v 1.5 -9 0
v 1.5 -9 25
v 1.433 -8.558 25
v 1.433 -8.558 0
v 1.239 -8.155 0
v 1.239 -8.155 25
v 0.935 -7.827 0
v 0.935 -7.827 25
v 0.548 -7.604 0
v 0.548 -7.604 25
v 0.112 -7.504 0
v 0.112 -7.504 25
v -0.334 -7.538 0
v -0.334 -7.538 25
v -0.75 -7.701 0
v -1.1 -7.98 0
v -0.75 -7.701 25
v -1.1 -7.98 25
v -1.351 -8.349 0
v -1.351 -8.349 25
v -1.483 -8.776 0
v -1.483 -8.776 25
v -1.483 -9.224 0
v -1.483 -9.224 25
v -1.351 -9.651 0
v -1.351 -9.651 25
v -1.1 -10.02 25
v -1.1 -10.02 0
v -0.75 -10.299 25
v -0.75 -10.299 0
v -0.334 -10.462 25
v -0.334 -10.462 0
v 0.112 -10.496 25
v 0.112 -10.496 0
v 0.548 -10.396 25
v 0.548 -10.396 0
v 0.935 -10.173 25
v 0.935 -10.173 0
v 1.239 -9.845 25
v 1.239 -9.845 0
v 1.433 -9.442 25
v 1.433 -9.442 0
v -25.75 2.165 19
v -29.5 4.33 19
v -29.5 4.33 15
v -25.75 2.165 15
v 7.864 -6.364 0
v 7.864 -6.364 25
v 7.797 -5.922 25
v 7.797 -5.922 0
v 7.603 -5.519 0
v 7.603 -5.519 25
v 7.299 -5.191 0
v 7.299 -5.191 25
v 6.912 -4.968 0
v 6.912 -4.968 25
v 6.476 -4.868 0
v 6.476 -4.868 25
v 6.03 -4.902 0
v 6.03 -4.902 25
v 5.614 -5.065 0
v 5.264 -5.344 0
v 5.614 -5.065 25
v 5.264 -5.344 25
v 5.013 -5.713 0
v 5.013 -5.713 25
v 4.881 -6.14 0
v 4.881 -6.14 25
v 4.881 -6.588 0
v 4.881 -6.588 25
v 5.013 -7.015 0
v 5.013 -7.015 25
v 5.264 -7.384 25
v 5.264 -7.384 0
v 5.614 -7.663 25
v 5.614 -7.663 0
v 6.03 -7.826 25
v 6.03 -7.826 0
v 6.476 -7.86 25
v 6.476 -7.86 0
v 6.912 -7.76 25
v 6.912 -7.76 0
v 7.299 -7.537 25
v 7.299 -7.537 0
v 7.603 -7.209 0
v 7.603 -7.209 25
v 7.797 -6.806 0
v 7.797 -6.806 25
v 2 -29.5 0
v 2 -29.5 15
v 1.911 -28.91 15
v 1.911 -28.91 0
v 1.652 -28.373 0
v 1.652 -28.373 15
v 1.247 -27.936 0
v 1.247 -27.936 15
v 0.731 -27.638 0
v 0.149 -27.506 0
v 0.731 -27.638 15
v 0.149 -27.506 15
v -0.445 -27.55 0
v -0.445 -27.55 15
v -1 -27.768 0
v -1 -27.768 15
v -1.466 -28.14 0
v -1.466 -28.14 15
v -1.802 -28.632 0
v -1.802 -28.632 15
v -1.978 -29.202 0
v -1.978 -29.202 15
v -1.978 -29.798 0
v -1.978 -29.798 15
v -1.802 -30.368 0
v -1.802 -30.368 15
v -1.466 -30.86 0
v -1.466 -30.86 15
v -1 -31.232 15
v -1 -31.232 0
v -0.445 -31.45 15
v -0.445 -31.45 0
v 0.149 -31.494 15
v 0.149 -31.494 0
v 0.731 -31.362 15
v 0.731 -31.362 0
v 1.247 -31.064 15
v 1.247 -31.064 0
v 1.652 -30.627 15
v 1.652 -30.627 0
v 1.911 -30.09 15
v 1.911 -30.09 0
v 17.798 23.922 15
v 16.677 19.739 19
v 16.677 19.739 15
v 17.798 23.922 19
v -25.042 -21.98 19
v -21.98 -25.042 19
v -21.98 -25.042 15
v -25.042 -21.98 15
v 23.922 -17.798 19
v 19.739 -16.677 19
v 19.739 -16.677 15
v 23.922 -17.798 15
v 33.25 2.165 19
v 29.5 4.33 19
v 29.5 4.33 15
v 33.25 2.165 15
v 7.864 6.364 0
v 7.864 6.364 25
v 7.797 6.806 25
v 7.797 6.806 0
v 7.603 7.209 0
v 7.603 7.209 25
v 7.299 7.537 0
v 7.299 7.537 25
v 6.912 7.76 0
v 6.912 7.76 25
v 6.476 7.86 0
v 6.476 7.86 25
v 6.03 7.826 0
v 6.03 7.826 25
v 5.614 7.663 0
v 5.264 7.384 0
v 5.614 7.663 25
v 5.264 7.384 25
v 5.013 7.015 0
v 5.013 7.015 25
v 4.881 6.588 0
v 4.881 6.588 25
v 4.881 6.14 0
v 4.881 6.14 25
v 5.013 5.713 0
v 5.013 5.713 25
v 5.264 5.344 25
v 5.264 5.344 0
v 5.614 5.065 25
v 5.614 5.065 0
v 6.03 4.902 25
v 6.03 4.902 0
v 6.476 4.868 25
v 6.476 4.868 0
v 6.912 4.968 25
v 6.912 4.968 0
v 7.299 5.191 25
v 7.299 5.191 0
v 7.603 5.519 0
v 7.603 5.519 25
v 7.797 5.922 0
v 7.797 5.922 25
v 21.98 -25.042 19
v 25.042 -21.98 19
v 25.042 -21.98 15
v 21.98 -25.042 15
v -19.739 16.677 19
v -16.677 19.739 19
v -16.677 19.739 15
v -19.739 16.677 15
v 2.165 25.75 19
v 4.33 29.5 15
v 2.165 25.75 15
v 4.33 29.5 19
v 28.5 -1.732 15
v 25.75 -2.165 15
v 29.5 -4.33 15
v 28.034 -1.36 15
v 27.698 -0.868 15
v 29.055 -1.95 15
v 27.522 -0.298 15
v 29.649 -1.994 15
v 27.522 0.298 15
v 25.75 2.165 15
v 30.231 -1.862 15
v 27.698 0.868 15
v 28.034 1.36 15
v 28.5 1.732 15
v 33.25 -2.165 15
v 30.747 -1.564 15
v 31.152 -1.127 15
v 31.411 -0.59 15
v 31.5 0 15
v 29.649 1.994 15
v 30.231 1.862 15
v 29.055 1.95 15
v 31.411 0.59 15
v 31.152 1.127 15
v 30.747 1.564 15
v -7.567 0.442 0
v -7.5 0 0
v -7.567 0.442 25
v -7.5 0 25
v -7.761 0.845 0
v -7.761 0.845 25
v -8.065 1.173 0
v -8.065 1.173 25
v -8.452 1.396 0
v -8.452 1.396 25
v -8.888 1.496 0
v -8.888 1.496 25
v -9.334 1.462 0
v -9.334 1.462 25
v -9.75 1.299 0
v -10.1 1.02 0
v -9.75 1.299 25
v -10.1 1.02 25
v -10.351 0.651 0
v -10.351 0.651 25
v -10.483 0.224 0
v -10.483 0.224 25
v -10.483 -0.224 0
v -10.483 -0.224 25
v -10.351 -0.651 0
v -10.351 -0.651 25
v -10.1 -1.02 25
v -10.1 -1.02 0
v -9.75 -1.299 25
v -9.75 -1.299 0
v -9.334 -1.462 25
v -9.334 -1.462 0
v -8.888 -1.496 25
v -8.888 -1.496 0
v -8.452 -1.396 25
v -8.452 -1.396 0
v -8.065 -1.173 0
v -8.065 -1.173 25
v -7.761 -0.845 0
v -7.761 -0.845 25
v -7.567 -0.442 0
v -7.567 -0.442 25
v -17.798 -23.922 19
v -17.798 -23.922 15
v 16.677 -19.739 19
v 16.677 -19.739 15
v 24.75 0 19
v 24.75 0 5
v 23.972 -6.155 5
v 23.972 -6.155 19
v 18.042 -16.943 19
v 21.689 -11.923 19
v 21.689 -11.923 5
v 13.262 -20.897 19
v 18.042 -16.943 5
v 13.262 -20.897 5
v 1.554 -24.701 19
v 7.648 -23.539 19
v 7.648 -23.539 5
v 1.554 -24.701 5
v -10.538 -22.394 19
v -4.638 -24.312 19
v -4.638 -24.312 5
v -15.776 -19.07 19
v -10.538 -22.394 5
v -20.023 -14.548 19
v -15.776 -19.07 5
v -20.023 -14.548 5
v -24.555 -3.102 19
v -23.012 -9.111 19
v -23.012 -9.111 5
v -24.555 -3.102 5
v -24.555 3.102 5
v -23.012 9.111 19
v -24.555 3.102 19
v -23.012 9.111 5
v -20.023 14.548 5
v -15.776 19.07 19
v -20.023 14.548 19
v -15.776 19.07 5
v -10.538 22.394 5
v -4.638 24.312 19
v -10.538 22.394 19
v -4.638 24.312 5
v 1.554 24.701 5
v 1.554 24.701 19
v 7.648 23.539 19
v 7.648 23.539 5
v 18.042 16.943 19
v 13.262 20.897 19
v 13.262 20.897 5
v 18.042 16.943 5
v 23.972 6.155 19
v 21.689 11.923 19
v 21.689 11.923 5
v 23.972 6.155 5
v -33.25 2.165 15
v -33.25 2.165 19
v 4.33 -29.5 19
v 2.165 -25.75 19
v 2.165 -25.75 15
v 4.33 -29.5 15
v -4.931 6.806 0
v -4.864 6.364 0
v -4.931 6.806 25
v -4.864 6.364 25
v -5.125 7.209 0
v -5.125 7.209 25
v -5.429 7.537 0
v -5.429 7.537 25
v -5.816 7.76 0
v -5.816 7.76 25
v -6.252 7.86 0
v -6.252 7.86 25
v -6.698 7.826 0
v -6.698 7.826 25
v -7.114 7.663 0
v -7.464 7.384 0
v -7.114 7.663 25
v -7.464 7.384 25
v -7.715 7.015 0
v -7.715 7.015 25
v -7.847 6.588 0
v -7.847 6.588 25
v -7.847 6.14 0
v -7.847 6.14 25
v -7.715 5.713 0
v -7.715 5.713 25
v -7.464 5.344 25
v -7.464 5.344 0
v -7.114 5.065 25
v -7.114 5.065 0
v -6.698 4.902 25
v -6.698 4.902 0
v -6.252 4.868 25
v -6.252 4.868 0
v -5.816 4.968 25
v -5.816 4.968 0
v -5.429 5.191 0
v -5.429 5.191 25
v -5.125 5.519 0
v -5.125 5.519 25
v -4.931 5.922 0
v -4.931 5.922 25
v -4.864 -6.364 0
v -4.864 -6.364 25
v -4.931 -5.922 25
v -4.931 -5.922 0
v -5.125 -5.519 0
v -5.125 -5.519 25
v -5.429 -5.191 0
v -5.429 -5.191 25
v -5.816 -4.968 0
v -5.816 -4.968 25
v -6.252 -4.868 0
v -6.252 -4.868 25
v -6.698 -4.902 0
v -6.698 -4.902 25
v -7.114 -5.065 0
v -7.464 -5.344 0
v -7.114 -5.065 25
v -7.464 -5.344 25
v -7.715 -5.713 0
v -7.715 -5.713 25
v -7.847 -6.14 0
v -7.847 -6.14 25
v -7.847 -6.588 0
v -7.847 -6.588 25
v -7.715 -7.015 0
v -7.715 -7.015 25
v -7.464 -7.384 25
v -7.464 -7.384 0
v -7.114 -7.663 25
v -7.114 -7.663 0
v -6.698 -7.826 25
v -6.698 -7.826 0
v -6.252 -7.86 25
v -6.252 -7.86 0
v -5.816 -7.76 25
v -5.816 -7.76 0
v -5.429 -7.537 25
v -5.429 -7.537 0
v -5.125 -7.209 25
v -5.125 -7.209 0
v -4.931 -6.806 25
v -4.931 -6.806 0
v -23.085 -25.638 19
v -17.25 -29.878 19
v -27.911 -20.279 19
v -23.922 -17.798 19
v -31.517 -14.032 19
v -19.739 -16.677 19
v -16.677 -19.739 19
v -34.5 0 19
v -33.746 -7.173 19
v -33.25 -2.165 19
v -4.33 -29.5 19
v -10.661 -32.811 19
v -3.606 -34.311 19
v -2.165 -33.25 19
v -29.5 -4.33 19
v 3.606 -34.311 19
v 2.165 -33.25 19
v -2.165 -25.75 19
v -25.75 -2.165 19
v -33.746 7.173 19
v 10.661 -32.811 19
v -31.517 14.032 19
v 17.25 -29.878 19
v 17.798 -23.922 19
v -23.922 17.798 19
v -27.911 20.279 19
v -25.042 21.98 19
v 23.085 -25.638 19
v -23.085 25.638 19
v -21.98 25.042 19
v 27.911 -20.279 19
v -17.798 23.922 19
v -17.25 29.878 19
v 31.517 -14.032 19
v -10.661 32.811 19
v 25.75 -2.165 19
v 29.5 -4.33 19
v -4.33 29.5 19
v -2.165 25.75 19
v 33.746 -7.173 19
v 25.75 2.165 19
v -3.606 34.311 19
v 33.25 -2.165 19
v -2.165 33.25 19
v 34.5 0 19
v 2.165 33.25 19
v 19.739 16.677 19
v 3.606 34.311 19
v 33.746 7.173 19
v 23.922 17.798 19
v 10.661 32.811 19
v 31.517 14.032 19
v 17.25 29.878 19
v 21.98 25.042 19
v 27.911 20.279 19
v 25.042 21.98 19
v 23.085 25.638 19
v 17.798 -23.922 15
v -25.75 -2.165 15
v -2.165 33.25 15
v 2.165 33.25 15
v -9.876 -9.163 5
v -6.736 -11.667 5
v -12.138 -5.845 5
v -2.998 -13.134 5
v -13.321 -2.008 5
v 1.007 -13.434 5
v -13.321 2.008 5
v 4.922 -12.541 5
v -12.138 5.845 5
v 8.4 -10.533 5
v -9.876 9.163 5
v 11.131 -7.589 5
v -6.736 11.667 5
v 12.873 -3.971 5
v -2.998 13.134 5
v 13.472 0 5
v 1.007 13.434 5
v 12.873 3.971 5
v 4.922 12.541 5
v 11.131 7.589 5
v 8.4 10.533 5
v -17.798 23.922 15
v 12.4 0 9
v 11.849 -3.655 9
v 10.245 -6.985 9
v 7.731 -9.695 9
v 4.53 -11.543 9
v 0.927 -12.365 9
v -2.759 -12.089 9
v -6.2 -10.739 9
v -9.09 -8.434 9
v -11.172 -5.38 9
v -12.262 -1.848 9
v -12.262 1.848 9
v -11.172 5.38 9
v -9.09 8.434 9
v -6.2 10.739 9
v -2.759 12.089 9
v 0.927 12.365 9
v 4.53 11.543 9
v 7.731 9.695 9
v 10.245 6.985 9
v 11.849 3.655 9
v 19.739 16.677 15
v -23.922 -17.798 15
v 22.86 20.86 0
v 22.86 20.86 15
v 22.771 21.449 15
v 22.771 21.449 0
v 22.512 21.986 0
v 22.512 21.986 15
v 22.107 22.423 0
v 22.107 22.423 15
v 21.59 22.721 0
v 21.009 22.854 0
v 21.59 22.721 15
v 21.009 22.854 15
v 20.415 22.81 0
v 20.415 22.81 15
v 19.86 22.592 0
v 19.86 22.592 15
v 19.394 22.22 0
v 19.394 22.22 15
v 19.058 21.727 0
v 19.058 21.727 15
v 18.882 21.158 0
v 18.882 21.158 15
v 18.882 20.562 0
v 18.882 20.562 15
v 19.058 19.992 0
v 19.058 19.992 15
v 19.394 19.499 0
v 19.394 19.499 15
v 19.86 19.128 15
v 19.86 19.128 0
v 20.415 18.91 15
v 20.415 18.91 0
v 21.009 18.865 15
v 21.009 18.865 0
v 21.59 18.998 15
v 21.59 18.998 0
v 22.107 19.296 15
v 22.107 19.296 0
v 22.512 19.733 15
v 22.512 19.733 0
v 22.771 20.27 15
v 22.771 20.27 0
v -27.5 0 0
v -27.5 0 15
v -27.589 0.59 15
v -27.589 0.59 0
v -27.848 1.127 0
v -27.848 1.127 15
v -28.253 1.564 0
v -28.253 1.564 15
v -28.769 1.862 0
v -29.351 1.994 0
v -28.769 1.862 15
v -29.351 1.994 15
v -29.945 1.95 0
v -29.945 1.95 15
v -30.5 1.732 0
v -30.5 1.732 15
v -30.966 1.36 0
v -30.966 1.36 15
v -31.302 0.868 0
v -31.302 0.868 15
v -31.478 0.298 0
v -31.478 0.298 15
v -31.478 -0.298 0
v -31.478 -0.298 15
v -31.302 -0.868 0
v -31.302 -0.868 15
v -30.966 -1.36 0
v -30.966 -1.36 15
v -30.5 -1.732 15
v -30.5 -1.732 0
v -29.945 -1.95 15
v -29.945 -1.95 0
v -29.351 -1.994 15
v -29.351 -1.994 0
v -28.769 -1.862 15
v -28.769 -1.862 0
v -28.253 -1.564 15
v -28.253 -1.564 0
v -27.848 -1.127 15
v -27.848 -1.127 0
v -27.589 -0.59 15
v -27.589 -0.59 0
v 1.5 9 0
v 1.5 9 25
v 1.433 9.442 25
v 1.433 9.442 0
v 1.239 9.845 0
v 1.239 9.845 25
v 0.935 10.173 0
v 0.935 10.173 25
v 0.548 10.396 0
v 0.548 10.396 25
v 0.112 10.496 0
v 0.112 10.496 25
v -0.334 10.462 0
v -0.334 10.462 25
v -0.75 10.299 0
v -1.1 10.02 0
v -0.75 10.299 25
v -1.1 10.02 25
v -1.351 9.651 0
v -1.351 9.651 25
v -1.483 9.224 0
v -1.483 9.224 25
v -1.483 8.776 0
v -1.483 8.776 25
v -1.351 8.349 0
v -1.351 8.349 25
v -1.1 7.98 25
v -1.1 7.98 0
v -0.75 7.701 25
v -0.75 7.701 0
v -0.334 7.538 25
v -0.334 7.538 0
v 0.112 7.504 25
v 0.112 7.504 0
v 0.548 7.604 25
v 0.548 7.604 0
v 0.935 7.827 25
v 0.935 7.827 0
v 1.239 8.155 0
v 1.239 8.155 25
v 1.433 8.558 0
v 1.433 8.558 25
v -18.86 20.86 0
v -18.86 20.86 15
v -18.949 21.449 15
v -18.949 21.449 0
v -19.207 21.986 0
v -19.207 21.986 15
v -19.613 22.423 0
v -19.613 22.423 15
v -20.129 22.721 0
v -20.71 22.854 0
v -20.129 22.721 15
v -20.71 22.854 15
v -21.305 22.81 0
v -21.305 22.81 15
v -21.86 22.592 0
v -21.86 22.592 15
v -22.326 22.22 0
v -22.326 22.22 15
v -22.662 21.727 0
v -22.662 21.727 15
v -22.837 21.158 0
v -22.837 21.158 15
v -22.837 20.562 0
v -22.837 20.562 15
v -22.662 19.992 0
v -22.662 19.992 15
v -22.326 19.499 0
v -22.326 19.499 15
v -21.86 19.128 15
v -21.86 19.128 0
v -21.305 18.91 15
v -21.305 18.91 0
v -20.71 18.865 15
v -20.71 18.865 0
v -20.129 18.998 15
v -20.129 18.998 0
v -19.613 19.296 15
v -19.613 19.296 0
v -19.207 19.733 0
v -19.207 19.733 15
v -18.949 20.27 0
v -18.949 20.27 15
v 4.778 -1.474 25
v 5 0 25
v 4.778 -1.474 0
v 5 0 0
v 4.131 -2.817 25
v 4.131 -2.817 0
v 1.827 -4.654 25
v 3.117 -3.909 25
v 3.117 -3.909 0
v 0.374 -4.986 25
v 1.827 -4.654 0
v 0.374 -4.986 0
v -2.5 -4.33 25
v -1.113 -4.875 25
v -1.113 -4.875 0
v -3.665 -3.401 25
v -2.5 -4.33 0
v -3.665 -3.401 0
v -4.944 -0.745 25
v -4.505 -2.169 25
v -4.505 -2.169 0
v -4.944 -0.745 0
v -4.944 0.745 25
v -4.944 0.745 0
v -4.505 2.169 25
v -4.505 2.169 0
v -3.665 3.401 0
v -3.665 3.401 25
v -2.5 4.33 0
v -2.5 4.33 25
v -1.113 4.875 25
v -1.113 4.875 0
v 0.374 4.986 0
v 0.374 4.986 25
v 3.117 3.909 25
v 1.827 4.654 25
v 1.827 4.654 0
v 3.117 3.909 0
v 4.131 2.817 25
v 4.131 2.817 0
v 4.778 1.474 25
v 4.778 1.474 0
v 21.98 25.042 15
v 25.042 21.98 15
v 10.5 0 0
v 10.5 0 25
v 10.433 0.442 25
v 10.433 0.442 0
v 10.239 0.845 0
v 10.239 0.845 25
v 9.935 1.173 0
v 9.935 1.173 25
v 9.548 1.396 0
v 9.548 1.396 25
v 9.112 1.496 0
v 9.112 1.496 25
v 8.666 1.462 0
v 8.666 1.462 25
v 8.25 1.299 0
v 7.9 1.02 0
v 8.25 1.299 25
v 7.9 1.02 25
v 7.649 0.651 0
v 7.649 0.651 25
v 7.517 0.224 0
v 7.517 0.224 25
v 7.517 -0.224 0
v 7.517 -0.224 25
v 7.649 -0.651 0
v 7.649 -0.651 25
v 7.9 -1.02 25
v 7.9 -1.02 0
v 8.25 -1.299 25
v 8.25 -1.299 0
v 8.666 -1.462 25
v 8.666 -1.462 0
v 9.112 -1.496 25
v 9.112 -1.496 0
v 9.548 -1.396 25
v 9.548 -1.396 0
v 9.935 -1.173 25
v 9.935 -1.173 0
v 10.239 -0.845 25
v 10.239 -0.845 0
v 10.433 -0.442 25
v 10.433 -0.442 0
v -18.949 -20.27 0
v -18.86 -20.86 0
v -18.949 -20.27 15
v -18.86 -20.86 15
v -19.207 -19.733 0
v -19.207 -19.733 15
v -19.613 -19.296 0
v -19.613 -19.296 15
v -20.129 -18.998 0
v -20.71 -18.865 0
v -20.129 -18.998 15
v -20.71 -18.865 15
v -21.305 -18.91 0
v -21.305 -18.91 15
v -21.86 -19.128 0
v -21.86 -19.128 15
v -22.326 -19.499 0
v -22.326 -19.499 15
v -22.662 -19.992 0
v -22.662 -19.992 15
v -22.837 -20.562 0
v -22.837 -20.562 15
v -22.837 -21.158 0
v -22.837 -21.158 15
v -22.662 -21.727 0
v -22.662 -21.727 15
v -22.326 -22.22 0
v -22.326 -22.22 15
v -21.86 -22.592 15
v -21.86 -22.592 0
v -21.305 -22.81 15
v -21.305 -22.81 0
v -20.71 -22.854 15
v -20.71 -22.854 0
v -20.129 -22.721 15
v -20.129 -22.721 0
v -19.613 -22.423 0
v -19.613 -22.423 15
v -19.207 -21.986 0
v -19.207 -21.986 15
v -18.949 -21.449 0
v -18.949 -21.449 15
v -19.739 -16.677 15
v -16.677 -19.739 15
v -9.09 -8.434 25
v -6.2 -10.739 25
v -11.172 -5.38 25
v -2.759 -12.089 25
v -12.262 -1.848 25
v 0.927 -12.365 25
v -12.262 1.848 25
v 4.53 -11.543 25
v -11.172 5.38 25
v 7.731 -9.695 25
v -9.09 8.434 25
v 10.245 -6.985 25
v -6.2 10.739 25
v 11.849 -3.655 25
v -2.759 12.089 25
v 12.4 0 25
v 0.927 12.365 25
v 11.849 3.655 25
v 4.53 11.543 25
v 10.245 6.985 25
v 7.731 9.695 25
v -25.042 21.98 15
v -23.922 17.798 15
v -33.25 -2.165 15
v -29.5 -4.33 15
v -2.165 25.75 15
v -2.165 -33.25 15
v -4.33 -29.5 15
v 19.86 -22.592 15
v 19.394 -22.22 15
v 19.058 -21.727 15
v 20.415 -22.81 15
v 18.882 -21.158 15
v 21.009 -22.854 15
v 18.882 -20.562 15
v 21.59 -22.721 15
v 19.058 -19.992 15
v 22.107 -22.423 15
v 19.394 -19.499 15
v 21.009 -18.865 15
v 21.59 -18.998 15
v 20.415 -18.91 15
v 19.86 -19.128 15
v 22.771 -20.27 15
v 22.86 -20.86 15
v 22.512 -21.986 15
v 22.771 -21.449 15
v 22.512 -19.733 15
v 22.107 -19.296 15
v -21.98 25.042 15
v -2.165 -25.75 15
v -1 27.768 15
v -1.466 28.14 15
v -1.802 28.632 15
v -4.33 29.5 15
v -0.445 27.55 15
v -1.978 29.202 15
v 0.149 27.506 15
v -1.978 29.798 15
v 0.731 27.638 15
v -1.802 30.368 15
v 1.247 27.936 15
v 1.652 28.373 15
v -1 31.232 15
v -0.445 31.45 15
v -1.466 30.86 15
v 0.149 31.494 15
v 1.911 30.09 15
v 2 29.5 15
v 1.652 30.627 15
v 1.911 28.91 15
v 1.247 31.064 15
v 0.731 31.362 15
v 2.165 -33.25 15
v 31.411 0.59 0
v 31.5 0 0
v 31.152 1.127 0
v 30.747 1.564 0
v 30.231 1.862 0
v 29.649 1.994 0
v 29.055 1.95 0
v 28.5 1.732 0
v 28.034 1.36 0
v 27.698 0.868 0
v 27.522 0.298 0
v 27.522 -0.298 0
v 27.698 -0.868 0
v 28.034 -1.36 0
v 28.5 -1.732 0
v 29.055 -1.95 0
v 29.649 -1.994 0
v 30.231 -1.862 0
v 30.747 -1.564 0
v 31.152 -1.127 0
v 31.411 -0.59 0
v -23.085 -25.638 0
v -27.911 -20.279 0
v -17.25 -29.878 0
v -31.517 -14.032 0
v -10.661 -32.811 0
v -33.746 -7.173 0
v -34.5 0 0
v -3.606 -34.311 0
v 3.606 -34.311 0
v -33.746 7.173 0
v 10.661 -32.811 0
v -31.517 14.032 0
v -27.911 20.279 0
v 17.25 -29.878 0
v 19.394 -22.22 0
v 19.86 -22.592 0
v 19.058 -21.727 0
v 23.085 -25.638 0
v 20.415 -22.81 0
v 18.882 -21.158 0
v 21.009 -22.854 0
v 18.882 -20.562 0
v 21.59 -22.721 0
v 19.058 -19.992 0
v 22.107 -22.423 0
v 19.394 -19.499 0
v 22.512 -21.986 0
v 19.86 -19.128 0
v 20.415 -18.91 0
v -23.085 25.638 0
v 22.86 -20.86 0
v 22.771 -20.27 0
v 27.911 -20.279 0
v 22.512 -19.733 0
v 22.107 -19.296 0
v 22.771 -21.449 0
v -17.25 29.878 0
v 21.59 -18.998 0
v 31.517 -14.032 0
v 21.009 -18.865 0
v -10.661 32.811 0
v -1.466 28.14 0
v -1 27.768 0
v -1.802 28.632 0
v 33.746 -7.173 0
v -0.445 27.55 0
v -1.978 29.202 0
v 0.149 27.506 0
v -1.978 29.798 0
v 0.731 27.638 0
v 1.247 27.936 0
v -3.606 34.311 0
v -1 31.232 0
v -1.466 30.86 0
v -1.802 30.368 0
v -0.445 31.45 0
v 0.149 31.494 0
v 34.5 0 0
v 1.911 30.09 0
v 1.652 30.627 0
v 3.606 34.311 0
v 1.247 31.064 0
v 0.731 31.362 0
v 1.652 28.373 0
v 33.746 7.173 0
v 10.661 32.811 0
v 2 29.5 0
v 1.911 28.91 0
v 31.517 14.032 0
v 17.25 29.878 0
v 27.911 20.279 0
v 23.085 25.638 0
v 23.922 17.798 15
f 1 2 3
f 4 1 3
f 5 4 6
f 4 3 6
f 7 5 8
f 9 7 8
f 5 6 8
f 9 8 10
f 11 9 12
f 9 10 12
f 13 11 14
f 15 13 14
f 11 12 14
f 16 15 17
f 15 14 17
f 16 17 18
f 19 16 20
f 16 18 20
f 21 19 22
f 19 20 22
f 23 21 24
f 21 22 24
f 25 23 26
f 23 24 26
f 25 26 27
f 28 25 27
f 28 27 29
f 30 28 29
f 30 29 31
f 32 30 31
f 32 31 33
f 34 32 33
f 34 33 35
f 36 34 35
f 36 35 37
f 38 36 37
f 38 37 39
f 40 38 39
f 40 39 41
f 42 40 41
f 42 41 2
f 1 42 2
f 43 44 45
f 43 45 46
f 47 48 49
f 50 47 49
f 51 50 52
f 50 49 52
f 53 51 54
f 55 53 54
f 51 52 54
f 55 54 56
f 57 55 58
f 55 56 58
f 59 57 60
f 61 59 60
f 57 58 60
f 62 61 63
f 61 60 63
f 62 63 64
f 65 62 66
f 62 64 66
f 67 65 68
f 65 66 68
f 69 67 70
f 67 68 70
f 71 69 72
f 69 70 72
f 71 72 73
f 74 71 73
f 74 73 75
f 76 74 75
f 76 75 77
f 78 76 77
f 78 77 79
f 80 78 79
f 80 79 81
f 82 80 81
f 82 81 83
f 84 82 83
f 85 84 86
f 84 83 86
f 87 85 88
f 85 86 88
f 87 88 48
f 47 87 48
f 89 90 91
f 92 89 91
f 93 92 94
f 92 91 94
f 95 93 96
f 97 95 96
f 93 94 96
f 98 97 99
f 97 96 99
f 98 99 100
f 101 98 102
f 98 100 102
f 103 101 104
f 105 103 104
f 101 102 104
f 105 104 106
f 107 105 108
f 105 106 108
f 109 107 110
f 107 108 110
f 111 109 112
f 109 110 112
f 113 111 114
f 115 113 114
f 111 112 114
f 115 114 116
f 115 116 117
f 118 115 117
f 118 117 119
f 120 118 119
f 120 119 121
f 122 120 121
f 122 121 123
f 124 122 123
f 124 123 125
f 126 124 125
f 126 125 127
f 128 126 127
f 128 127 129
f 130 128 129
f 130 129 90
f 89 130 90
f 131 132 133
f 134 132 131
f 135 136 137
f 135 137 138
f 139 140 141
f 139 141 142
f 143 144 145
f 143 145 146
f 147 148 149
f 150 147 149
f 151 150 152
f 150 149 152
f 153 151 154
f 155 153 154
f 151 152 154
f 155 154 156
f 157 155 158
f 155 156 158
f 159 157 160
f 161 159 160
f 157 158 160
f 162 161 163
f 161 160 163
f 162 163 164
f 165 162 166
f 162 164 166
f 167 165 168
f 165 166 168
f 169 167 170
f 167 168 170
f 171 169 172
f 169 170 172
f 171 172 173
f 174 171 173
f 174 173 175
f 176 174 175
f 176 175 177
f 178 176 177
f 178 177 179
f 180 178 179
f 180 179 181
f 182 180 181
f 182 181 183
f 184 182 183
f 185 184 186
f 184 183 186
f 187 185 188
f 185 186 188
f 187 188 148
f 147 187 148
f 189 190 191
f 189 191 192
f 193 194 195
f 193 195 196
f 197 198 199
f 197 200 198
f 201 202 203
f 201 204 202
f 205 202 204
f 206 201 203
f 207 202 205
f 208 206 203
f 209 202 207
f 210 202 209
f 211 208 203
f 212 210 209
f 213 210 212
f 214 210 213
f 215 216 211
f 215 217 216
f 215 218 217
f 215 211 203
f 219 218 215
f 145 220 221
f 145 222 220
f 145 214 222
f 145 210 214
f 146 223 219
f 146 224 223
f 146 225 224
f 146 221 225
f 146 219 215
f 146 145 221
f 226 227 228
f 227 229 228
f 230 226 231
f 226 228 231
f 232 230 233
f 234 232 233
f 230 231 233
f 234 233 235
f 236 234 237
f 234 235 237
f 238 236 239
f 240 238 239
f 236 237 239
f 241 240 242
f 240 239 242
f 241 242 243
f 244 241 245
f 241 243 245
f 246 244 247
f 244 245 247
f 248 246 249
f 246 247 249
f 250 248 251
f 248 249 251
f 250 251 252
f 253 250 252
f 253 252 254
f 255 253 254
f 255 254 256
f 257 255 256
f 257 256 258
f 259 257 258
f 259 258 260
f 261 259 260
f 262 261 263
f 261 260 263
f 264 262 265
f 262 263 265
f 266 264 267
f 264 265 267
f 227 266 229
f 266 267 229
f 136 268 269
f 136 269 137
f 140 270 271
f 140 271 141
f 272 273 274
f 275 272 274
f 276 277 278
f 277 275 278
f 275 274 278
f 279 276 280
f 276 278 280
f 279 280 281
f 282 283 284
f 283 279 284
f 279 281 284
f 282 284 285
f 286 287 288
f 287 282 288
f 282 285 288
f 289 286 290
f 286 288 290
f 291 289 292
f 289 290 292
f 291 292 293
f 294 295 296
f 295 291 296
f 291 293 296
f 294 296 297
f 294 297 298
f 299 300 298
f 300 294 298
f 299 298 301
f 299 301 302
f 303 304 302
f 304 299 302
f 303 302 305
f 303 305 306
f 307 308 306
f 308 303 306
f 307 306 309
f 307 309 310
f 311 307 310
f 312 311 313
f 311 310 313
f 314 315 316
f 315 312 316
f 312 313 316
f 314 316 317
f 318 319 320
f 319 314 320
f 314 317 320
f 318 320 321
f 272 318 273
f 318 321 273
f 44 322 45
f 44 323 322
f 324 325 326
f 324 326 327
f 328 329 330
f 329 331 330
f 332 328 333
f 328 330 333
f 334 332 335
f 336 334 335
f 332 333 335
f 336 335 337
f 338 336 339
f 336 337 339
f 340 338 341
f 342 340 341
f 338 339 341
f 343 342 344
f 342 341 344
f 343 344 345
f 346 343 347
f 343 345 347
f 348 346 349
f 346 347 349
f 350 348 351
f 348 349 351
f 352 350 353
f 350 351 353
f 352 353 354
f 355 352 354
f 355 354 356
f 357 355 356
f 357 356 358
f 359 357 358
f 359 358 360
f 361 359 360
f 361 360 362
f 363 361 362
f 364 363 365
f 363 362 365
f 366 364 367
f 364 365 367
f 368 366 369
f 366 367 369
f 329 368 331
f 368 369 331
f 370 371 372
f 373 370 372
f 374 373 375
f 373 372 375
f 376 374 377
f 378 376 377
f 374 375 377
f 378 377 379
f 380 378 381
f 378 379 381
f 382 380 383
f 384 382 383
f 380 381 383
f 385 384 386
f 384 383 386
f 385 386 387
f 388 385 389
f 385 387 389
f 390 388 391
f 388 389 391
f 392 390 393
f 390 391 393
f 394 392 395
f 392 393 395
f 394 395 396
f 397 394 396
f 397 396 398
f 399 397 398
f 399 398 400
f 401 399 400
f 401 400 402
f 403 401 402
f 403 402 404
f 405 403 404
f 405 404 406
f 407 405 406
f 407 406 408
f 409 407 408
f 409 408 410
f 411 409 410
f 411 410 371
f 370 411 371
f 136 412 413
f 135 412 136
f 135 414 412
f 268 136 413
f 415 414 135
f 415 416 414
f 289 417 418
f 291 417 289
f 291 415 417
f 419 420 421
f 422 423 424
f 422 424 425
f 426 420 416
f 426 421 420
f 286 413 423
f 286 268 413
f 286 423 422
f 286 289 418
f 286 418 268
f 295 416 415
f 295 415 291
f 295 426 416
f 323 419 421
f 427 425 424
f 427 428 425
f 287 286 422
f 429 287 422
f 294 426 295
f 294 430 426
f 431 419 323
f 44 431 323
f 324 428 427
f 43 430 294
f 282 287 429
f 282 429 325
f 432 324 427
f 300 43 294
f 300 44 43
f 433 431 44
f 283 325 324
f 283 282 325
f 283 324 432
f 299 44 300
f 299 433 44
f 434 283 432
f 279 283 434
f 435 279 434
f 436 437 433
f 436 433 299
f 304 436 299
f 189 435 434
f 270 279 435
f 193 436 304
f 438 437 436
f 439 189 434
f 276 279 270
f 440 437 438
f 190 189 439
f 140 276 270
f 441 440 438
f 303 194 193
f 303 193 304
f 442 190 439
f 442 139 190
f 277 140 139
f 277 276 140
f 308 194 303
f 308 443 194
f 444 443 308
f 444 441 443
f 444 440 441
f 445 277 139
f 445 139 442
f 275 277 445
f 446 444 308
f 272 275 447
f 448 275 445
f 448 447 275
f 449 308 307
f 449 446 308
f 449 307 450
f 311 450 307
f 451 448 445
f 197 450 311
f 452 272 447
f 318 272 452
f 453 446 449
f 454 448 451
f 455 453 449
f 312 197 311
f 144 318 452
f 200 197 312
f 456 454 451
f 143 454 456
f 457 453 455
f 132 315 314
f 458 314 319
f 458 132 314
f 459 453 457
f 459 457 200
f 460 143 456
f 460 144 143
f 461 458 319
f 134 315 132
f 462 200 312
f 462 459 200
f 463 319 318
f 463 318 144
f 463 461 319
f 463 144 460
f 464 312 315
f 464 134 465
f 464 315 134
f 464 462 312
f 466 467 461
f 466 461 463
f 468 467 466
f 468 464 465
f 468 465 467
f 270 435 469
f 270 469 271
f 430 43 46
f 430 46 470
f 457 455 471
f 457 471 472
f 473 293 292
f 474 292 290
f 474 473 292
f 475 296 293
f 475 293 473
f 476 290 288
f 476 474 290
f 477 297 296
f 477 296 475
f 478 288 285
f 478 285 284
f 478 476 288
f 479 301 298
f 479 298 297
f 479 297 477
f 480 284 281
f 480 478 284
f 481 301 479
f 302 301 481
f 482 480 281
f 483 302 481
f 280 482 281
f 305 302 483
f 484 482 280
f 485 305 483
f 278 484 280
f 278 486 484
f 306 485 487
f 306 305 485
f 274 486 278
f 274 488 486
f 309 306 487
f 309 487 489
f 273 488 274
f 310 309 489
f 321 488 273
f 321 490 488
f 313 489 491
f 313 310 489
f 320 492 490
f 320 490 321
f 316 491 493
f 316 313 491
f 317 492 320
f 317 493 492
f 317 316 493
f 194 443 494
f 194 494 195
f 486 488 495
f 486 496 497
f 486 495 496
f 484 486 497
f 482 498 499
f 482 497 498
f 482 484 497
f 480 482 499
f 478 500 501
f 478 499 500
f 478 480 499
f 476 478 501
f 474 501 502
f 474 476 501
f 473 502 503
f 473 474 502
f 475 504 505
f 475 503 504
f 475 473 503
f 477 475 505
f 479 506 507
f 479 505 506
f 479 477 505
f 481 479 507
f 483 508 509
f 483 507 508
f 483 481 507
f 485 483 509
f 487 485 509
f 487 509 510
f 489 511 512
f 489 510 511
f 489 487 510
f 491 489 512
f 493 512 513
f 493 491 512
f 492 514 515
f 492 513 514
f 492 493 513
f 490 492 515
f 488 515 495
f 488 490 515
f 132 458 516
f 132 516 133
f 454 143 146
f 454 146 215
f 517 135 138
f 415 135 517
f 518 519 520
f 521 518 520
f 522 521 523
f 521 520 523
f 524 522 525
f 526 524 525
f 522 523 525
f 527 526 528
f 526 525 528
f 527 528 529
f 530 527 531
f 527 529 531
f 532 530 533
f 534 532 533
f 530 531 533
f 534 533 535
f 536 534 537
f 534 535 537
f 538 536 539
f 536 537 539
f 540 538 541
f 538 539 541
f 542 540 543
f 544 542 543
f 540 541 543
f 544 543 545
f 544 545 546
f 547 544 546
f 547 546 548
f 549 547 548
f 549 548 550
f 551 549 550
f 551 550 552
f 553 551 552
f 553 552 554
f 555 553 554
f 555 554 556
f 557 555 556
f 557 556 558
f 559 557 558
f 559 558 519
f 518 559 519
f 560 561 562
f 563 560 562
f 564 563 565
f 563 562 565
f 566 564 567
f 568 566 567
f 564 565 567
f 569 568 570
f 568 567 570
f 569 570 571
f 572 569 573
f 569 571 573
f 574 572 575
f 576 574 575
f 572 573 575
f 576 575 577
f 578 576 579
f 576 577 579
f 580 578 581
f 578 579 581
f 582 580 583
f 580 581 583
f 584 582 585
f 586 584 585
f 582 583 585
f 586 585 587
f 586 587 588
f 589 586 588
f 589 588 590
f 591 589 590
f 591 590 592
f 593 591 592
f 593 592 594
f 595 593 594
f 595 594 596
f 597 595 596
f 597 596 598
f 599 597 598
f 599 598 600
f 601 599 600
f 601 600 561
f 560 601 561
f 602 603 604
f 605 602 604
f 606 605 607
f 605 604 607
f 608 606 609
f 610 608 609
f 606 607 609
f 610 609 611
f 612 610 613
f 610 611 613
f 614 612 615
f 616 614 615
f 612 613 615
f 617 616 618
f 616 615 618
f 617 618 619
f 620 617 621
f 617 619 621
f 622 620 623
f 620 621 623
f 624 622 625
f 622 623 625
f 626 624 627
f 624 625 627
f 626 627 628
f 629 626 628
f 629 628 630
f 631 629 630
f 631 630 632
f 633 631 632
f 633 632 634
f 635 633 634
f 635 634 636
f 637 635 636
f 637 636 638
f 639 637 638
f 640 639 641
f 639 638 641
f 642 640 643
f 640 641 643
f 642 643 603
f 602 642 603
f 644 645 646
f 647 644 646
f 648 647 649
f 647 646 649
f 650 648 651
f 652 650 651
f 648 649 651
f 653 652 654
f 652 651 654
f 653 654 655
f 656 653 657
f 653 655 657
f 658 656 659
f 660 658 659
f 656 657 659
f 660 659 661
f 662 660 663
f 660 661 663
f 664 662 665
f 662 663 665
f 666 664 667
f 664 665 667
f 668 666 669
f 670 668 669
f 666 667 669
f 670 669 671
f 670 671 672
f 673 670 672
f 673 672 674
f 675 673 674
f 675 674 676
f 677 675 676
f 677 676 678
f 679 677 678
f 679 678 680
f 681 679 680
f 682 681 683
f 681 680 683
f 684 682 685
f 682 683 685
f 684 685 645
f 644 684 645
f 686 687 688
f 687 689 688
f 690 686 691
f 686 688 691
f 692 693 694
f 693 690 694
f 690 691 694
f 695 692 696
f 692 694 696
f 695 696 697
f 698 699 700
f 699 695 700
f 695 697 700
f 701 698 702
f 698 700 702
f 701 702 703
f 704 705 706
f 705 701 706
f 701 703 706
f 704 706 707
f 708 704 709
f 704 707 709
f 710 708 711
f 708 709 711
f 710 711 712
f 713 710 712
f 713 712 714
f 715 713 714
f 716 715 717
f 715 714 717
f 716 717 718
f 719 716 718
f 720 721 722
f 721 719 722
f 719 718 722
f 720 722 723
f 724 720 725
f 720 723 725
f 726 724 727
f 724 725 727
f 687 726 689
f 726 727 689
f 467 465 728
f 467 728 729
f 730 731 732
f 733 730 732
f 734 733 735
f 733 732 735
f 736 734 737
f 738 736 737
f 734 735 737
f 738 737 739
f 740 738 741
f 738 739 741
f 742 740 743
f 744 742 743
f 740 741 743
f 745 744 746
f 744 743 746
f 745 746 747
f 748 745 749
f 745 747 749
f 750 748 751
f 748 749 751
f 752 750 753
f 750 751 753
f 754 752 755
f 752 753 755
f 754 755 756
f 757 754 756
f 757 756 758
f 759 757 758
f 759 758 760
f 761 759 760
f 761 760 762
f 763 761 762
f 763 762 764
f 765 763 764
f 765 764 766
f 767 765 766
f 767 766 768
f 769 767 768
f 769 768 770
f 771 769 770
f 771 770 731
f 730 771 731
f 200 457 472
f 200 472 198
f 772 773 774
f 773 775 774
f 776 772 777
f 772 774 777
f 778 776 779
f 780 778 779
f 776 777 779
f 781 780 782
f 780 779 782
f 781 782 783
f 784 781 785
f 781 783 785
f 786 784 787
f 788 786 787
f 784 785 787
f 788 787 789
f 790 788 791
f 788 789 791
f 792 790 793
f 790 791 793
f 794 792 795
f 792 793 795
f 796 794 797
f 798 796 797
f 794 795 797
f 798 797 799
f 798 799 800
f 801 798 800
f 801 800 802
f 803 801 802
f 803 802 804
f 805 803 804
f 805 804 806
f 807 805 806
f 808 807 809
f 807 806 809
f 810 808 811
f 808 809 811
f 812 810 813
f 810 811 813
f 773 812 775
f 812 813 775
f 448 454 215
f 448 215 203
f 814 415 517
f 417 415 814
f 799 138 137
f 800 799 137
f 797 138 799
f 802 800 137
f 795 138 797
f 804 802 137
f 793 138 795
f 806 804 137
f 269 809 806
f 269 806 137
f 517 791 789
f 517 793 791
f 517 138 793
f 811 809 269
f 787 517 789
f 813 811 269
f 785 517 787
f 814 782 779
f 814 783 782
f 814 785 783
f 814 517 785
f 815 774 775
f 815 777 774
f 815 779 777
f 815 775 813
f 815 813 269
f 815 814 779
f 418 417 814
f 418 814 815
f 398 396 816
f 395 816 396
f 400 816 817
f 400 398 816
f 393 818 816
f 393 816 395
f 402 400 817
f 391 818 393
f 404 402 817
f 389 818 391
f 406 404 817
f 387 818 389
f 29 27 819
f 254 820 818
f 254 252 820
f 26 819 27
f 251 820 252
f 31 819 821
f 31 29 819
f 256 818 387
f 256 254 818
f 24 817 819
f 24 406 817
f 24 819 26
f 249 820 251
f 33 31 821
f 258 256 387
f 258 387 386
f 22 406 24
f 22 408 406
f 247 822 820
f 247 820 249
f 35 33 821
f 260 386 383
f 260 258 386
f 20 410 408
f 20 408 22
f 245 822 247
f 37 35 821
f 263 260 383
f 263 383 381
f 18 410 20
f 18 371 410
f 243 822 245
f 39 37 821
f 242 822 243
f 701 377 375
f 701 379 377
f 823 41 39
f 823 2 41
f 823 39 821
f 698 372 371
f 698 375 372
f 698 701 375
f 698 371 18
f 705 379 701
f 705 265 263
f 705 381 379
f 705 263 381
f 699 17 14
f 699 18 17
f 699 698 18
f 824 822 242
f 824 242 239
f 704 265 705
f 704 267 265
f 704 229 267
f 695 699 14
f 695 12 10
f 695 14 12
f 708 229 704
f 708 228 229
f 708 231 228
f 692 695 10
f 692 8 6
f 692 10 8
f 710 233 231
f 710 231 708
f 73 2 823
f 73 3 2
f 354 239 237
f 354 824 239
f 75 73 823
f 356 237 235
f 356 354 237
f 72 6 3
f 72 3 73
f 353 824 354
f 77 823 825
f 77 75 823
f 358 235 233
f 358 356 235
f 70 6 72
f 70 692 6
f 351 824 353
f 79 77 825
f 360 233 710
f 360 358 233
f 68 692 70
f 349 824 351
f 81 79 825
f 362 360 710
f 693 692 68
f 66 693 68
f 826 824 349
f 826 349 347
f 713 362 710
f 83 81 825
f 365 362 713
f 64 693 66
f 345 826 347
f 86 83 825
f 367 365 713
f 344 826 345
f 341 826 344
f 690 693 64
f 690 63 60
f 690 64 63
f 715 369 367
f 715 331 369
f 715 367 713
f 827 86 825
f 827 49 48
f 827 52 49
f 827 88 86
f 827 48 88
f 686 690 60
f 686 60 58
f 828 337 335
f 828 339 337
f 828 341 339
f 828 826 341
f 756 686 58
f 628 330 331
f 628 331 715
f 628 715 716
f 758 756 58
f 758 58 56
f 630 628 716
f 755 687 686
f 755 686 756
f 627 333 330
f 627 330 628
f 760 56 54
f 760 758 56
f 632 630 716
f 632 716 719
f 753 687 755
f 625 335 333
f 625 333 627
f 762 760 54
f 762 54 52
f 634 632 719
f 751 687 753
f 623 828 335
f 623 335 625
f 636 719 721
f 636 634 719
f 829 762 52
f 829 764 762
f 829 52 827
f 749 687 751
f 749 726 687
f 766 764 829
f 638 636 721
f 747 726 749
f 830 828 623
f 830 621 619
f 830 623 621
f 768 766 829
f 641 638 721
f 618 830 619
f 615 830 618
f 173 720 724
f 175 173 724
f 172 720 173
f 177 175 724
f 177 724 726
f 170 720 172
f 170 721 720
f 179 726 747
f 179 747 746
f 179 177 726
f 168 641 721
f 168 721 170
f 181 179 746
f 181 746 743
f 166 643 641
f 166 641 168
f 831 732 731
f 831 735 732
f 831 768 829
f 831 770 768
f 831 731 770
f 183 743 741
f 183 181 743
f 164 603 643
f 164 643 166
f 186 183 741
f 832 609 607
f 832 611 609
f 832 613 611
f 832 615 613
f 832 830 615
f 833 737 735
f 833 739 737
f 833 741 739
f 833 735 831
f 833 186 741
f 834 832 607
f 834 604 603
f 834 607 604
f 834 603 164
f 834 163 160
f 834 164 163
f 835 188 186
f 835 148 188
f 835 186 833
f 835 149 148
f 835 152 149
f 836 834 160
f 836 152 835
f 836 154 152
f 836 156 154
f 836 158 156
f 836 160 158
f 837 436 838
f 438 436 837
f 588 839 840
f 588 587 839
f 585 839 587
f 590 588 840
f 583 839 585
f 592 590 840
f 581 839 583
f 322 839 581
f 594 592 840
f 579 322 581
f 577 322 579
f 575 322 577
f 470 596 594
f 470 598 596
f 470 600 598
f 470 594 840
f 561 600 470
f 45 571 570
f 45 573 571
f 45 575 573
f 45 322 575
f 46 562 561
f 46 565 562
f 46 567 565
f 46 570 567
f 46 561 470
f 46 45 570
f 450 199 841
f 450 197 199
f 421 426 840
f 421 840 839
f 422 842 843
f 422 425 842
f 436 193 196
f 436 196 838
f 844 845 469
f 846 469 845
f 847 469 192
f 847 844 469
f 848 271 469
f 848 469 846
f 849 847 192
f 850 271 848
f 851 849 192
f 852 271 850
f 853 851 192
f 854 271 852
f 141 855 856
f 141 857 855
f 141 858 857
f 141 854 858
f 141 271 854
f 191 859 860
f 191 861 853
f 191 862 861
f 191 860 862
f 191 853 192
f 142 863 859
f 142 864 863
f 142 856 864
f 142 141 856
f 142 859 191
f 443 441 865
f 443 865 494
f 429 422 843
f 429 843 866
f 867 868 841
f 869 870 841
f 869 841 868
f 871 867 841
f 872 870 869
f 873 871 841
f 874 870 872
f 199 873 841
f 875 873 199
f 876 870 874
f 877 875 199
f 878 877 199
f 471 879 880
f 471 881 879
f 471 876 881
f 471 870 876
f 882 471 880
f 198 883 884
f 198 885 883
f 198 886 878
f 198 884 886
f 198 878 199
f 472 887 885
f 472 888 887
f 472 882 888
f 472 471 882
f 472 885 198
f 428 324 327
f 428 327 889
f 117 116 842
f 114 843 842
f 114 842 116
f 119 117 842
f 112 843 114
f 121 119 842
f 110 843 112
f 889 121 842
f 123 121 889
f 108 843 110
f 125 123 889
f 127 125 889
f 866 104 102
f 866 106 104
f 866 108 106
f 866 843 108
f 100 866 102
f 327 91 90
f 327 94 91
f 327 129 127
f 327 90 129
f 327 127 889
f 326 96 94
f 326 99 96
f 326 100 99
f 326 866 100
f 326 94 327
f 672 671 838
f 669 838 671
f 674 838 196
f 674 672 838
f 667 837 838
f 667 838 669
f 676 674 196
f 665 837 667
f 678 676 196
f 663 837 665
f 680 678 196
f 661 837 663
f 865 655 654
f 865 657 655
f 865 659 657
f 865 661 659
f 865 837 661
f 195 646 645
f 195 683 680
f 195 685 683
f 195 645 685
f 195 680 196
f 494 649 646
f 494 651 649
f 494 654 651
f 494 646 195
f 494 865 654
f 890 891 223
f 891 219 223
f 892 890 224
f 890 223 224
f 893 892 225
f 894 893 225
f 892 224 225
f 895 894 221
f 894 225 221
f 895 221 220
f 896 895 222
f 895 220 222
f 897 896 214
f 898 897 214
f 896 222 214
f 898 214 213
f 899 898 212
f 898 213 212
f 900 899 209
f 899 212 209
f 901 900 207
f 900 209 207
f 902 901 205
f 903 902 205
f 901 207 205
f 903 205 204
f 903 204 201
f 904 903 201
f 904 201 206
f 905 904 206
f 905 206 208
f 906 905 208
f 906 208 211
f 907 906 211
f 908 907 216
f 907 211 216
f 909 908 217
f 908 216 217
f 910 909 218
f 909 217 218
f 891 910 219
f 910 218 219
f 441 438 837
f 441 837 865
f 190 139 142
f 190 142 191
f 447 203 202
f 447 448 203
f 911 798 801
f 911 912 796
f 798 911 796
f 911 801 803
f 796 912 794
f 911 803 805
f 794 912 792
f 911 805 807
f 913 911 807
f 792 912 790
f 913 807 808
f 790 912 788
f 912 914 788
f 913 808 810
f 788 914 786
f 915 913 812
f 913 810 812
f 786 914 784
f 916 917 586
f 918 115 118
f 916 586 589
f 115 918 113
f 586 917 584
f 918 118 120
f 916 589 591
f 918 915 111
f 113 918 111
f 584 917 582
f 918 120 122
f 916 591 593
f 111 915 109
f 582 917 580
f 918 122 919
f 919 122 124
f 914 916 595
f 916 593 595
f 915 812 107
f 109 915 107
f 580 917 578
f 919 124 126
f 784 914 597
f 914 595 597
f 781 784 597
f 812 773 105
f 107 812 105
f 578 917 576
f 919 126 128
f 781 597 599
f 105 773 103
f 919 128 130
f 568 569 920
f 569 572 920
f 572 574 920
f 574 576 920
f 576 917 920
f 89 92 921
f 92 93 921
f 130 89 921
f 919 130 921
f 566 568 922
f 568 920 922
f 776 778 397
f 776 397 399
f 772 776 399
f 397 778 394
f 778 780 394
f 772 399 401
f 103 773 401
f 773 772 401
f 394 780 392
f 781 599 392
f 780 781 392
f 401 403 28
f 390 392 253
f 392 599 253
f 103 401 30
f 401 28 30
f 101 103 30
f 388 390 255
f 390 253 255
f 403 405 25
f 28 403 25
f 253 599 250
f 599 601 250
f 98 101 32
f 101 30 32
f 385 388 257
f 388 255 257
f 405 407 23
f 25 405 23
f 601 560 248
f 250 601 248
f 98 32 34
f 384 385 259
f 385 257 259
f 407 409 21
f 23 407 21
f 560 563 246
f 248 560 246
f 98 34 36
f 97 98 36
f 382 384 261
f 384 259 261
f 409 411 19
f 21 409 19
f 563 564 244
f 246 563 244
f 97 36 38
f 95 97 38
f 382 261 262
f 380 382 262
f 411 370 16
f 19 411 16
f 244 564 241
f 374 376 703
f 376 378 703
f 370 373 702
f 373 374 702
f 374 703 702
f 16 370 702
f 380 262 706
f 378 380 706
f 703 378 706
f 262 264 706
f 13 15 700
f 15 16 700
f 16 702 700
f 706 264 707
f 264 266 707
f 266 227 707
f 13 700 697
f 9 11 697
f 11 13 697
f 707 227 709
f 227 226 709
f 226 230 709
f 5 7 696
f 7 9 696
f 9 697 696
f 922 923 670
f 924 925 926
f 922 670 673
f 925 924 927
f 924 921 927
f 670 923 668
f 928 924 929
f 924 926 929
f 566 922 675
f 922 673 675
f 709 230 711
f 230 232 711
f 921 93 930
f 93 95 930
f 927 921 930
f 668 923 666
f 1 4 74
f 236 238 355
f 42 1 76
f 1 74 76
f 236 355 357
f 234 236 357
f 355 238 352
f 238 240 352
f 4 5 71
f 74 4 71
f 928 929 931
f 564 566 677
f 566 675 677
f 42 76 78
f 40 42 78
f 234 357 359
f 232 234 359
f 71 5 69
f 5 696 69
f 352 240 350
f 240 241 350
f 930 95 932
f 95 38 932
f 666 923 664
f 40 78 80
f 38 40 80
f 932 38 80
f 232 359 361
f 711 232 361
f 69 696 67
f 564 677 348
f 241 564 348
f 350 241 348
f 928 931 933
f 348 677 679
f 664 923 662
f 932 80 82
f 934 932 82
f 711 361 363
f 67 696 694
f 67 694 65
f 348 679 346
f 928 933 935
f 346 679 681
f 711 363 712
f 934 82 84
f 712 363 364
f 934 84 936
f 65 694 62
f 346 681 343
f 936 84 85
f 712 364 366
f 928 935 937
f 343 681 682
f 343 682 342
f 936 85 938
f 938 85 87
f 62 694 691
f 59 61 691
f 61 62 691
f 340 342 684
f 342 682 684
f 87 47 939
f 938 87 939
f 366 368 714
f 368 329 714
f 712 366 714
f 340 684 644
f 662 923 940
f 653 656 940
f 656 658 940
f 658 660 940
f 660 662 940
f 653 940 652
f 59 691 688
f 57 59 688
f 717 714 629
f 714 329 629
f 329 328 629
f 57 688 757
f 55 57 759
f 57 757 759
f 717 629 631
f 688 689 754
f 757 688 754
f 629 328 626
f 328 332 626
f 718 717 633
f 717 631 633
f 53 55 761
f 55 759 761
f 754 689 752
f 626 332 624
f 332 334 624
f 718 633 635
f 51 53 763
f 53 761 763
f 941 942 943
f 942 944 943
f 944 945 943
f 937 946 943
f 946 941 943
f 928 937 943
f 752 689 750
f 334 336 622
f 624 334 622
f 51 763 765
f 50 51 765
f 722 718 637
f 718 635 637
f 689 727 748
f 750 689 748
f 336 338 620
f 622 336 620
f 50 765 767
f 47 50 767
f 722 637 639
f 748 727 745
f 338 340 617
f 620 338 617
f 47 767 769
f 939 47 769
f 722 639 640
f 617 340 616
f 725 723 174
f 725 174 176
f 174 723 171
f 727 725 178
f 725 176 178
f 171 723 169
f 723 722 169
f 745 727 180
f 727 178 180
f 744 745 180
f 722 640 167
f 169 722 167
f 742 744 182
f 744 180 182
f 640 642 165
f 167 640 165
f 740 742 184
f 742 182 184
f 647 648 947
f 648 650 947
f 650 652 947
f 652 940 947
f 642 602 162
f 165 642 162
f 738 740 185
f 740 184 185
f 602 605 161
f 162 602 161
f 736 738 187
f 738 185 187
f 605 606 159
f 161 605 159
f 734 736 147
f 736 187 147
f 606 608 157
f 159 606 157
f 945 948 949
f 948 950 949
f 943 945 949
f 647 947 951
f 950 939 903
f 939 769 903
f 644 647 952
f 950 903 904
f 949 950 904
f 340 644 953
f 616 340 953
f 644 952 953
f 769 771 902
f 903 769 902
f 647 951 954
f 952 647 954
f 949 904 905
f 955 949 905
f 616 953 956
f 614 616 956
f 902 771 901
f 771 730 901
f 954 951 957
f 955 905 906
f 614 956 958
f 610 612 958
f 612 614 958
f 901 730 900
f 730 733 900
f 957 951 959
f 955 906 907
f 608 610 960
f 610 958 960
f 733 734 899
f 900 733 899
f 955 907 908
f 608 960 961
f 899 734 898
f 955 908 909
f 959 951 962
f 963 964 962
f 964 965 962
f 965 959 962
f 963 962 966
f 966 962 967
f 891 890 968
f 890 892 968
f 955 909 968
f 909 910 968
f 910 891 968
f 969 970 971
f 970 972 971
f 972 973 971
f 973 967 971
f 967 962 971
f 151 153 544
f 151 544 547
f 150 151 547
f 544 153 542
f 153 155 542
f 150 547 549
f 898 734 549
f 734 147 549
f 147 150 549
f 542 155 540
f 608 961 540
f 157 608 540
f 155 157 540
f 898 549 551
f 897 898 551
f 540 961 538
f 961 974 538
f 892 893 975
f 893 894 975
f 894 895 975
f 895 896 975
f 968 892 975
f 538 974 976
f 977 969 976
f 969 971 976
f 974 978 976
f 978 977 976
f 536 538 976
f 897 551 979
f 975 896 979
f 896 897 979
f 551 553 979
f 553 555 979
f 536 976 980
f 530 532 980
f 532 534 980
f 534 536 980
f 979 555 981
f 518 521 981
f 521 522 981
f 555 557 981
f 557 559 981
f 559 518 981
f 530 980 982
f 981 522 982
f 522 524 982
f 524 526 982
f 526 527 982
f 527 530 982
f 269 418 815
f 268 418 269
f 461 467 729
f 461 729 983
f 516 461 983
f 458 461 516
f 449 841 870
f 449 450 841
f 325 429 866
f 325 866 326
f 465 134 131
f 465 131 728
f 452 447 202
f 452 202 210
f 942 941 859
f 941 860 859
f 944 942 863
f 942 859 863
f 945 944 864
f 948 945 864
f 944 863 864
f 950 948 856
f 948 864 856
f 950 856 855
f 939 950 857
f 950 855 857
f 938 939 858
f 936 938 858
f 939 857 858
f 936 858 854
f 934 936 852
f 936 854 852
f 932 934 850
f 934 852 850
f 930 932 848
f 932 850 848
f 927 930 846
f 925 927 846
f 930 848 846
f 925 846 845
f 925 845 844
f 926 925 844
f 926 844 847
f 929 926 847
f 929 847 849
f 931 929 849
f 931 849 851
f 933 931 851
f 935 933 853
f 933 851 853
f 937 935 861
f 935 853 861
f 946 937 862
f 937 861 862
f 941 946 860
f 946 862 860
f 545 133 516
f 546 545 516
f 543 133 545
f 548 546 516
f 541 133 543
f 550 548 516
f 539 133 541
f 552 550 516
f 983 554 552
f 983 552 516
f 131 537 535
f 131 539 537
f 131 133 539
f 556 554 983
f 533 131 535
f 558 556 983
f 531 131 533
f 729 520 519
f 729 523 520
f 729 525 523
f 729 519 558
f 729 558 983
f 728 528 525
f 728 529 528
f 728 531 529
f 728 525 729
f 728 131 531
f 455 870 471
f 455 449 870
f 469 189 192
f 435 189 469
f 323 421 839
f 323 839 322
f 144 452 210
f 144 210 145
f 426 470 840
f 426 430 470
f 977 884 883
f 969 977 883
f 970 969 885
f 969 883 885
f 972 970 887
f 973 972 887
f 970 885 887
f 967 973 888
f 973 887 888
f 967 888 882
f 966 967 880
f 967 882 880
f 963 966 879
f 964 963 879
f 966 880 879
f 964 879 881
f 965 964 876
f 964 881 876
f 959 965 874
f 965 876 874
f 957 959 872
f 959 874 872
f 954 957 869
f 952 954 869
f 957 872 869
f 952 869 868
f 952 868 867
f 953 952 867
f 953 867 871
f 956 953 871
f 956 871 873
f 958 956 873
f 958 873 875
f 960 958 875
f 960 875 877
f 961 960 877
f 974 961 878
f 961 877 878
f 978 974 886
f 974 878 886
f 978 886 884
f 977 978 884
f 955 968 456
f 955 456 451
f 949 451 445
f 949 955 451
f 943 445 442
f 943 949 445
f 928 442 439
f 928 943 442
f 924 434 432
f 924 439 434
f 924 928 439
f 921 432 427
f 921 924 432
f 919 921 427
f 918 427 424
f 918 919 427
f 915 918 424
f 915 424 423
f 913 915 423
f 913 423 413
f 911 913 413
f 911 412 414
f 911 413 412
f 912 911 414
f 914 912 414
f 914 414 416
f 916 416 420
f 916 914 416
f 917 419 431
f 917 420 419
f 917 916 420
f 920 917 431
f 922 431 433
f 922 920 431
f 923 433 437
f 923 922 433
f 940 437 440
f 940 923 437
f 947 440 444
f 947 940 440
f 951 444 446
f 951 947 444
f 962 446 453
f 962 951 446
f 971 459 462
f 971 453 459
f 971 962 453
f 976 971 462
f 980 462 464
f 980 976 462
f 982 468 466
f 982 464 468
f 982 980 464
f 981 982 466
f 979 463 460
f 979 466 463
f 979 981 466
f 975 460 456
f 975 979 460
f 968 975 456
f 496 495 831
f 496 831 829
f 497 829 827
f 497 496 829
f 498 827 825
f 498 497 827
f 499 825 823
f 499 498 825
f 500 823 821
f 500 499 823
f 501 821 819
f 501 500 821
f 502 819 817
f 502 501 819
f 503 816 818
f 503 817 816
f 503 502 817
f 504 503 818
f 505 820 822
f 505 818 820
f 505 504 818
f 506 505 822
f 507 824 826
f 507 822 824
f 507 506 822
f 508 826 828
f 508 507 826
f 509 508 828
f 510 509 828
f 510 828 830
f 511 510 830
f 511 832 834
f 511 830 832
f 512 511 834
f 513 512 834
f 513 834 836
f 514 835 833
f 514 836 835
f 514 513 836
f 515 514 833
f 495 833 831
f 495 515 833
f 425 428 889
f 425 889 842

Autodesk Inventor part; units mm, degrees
ref_plane "YZ Plane" through (0, 0, 0) normal (1, 0, 0) x (0, 1, 0)
ref_plane "XZ Plane" through (0, 0, 0) normal (0, 1, 0) x (-1, 0, 0)
ref_plane "XY Plane" through (0, 0, 0) normal (0, 0, 1) x (1, 0, 0)
sketch "Sketch1" plane through (0, 0, 0) normal (0, 0, 1) x (1, 0, 0)
  circle A0 centre (0, 0) radius 5
  circle A1 centre (0, 0) radius 34.5
  dimension "d0" = 10
  dimension "d1" = 69
extrude "Extrusion1" add sketch "Sketch1" along normal blind 5
sketch "Sketch2" plane through (0, 0, 5) normal (0, 0, 1) x (1, 0, 0)
  circle A0 centre (0, 0) radius 24.75
  circle A1 centre (0, 0) radius 34.5 projected
  dimension "d4" = 49.5
extrude "Extrusion2" add sketch "Sketch2" along normal blind 14
sketch "Sketch3" plane through (0, 0, 5) normal (0, 0, 1) x (1, 0, 0)
  circle A0 centre (0, 0) radius 12.4
  circle A1 centre (0, 0) radius 5 projected
  dimension "d7" = 24.8
extrude "Extrusion3" add sketch "Sketch3" along normal blind 20
chamfer "Chamfer1" distance 4 angle 15 1 edges at (-12.4, 0, 5) measured on face at (12.2394, -1.9891, 18.3333)
sketch "Sketch4" plane through (0, 0, 25) normal (0, 0, 1) x (1, 0, 0)
  circle A0 centre (9, 0) radius 1.5
  circle A1 centre (6.364, 6.364) radius 1.5
  circle A2 centre (0, 9) radius 1.5
  circle A3 centre (-6.364, 6.364) radius 1.5
  circle A4 centre (-9, 0) radius 1.5
  circle A5 centre (-6.364, -6.364) radius 1.5
  circle A6 centre (0, -9) radius 1.5
  circle A7 centre (6.364, -6.364) radius 1.5
  point P0 (0, 0)
  dimension "d13" = 3
  dimension "d14" = 9
  dimension "d17" = 360
extrude "Extrusion4" cut sketch "Sketch4" against normal through all
sketch "Sketch5" plane through (0, 0, 19) normal (0, 0, 1) x (1, 0, 0)
  circle A0 centre (29.5, 0) radius 2
  circle A1 centre (20.8597, 20.8597) radius 2
  circle A2 centre (0, 29.5) radius 2
  circle A3 centre (-20.8597, 20.8597) radius 2
  circle A4 centre (-29.5, 0) radius 2
  circle A5 centre (-20.8597, -20.8597) radius 2
  circle A6 centre (0, -29.5) radius 2
  circle A7 centre (20.8597, -20.8597) radius 2
  point P0 (0, 0)
  dimension "d21" = 4
  dimension "d22" = 29.5
  dimension "d25" = 360
extrude "Extrusion5" cut sketch "Sketch5" against normal through all
sketch "Sketch8" plane through (0, 0, 19) normal (0, 0, 1) x (1, 0, 0)
  circle A0 centre (29.5, 0) radius 2 projected
  circle A1 centre (29.5, 0) radius 2 projected
  line L0 (29.5, 4.3301) -> (33.25, 2.1651)
  line L1 (33.25, 2.1651) -> (33.25, -2.1651)
  line L2 (33.25, -2.1651) -> (29.5, -4.3301)
  line L3 (29.5, -4.3301) -> (25.75, -2.1651)
  line L4 (25.75, -2.1651) -> (25.75, 2.1651)
  line L5 (25.75, 2.1651) -> (29.5, 4.3301)
  line L6 (17.7978, 23.9215) -> (21.9804, 25.0422)
  line L7 (21.9804, 25.0422) -> (25.0422, 21.9804)
  line L8 (25.0422, 21.9804) -> (23.9215, 17.7978)
  line L9 (23.9215, 17.7978) -> (19.7389, 16.6771)
  line L10 (19.7389, 16.6771) -> (16.6771, 19.7389)
  line L11 (16.6771, 19.7389) -> (17.7978, 23.9215)
  line L12 (-4.3301, 29.5) -> (-2.1651, 33.25)
  line L13 (-2.1651, 33.25) -> (2.1651, 33.25)
  line L14 (2.1651, 33.25) -> (4.3301, 29.5)
  line L15 (4.3301, 29.5) -> (2.1651, 25.75)
  line L16 (2.1651, 25.75) -> (-2.1651, 25.75)
  line L17 (-2.1651, 25.75) -> (-4.3301, 29.5)
  line L18 (-23.9215, 17.7978) -> (-25.0422, 21.9804)
  line L19 (-25.0422, 21.9804) -> (-21.9804, 25.0422)
  line L20 (-21.9804, 25.0422) -> (-17.7978, 23.9215)
  line L21 (-17.7978, 23.9215) -> (-16.6771, 19.7389)
  line L22 (-16.6771, 19.7389) -> (-19.7389, 16.6771)
  line L23 (-19.7389, 16.6771) -> (-23.9215, 17.7978)
  line L24 (-29.5, -4.3301) -> (-33.25, -2.1651)
  line L25 (-33.25, -2.1651) -> (-33.25, 2.1651)
  line L26 (-33.25, 2.1651) -> (-29.5, 4.3301)
  line L27 (-29.5, 4.3301) -> (-25.75, 2.1651)
  line L28 (-25.75, 2.1651) -> (-25.75, -2.1651)
  line L29 (-25.75, -2.1651) -> (-29.5, -4.3301)
  line L30 (-17.7978, -23.9215) -> (-21.9804, -25.0422)
  line L31 (-21.9804, -25.0422) -> (-25.0422, -21.9804)
  line L32 (-25.0422, -21.9804) -> (-23.9215, -17.7978)
  line L33 (-23.9215, -17.7978) -> (-19.7389, -16.6771)
  line L34 (-19.7389, -16.6771) -> (-16.6771, -19.7389)
  line L35 (-16.6771, -19.7389) -> (-17.7978, -23.9215)
  line L36 (4.3301, -29.5) -> (2.1651, -33.25)
  line L37 (2.1651, -33.25) -> (-2.1651, -33.25)
  line L38 (-2.1651, -33.25) -> (-4.3301, -29.5)
  line L39 (-4.3301, -29.5) -> (-2.1651, -25.75)
  line L40 (-2.1651, -25.75) -> (2.1651, -25.75)
  line L41 (2.1651, -25.75) -> (4.3301, -29.5)
  line L42 (23.9215, -17.7978) -> (25.0422, -21.9804)
  line L43 (25.0422, -21.9804) -> (21.9804, -25.0422)
  line L44 (21.9804, -25.0422) -> (17.7978, -23.9215)
  line L45 (17.7978, -23.9215) -> (16.6771, -19.7389)
  line L46 (16.6771, -19.7389) -> (19.7389, -16.6771)
  line L47 (19.7389, -16.6771) -> (23.9215, -17.7978)
  point P0 (0, 0)
  point P1 (20.8597, 20.8597)
  point P2 (0, 29.5)
  point P3 (-20.8597, 20.8597)
  point P4 (-29.5, 0)
  point P5 (-20.8597, -20.8597)
  point P6 (0, -29.5)
  point P7 (20.8597, -20.8597)
  dimension "d32" = 7.5
  dimension "d35" = 360
extrude "Extrusion7" cut sketch "Sketch8" against normal blind 4 contours A0 | L0 L1 L2 L3 L4 L5 | L6 L7 L8 L9 L10 L11 | L12 L13 L14 L15 L16 L17 | L18 L19 L20 L21 L22 L23 | L24 L25 L26 L27 L28 L29 | L30 L31 L32 L33 L34 L35 | L36 L37 L38 L39 L40 L41 | L42 L43 L44 L45 L46 L47
properties part number "CS01" material "ABS Plastic"
